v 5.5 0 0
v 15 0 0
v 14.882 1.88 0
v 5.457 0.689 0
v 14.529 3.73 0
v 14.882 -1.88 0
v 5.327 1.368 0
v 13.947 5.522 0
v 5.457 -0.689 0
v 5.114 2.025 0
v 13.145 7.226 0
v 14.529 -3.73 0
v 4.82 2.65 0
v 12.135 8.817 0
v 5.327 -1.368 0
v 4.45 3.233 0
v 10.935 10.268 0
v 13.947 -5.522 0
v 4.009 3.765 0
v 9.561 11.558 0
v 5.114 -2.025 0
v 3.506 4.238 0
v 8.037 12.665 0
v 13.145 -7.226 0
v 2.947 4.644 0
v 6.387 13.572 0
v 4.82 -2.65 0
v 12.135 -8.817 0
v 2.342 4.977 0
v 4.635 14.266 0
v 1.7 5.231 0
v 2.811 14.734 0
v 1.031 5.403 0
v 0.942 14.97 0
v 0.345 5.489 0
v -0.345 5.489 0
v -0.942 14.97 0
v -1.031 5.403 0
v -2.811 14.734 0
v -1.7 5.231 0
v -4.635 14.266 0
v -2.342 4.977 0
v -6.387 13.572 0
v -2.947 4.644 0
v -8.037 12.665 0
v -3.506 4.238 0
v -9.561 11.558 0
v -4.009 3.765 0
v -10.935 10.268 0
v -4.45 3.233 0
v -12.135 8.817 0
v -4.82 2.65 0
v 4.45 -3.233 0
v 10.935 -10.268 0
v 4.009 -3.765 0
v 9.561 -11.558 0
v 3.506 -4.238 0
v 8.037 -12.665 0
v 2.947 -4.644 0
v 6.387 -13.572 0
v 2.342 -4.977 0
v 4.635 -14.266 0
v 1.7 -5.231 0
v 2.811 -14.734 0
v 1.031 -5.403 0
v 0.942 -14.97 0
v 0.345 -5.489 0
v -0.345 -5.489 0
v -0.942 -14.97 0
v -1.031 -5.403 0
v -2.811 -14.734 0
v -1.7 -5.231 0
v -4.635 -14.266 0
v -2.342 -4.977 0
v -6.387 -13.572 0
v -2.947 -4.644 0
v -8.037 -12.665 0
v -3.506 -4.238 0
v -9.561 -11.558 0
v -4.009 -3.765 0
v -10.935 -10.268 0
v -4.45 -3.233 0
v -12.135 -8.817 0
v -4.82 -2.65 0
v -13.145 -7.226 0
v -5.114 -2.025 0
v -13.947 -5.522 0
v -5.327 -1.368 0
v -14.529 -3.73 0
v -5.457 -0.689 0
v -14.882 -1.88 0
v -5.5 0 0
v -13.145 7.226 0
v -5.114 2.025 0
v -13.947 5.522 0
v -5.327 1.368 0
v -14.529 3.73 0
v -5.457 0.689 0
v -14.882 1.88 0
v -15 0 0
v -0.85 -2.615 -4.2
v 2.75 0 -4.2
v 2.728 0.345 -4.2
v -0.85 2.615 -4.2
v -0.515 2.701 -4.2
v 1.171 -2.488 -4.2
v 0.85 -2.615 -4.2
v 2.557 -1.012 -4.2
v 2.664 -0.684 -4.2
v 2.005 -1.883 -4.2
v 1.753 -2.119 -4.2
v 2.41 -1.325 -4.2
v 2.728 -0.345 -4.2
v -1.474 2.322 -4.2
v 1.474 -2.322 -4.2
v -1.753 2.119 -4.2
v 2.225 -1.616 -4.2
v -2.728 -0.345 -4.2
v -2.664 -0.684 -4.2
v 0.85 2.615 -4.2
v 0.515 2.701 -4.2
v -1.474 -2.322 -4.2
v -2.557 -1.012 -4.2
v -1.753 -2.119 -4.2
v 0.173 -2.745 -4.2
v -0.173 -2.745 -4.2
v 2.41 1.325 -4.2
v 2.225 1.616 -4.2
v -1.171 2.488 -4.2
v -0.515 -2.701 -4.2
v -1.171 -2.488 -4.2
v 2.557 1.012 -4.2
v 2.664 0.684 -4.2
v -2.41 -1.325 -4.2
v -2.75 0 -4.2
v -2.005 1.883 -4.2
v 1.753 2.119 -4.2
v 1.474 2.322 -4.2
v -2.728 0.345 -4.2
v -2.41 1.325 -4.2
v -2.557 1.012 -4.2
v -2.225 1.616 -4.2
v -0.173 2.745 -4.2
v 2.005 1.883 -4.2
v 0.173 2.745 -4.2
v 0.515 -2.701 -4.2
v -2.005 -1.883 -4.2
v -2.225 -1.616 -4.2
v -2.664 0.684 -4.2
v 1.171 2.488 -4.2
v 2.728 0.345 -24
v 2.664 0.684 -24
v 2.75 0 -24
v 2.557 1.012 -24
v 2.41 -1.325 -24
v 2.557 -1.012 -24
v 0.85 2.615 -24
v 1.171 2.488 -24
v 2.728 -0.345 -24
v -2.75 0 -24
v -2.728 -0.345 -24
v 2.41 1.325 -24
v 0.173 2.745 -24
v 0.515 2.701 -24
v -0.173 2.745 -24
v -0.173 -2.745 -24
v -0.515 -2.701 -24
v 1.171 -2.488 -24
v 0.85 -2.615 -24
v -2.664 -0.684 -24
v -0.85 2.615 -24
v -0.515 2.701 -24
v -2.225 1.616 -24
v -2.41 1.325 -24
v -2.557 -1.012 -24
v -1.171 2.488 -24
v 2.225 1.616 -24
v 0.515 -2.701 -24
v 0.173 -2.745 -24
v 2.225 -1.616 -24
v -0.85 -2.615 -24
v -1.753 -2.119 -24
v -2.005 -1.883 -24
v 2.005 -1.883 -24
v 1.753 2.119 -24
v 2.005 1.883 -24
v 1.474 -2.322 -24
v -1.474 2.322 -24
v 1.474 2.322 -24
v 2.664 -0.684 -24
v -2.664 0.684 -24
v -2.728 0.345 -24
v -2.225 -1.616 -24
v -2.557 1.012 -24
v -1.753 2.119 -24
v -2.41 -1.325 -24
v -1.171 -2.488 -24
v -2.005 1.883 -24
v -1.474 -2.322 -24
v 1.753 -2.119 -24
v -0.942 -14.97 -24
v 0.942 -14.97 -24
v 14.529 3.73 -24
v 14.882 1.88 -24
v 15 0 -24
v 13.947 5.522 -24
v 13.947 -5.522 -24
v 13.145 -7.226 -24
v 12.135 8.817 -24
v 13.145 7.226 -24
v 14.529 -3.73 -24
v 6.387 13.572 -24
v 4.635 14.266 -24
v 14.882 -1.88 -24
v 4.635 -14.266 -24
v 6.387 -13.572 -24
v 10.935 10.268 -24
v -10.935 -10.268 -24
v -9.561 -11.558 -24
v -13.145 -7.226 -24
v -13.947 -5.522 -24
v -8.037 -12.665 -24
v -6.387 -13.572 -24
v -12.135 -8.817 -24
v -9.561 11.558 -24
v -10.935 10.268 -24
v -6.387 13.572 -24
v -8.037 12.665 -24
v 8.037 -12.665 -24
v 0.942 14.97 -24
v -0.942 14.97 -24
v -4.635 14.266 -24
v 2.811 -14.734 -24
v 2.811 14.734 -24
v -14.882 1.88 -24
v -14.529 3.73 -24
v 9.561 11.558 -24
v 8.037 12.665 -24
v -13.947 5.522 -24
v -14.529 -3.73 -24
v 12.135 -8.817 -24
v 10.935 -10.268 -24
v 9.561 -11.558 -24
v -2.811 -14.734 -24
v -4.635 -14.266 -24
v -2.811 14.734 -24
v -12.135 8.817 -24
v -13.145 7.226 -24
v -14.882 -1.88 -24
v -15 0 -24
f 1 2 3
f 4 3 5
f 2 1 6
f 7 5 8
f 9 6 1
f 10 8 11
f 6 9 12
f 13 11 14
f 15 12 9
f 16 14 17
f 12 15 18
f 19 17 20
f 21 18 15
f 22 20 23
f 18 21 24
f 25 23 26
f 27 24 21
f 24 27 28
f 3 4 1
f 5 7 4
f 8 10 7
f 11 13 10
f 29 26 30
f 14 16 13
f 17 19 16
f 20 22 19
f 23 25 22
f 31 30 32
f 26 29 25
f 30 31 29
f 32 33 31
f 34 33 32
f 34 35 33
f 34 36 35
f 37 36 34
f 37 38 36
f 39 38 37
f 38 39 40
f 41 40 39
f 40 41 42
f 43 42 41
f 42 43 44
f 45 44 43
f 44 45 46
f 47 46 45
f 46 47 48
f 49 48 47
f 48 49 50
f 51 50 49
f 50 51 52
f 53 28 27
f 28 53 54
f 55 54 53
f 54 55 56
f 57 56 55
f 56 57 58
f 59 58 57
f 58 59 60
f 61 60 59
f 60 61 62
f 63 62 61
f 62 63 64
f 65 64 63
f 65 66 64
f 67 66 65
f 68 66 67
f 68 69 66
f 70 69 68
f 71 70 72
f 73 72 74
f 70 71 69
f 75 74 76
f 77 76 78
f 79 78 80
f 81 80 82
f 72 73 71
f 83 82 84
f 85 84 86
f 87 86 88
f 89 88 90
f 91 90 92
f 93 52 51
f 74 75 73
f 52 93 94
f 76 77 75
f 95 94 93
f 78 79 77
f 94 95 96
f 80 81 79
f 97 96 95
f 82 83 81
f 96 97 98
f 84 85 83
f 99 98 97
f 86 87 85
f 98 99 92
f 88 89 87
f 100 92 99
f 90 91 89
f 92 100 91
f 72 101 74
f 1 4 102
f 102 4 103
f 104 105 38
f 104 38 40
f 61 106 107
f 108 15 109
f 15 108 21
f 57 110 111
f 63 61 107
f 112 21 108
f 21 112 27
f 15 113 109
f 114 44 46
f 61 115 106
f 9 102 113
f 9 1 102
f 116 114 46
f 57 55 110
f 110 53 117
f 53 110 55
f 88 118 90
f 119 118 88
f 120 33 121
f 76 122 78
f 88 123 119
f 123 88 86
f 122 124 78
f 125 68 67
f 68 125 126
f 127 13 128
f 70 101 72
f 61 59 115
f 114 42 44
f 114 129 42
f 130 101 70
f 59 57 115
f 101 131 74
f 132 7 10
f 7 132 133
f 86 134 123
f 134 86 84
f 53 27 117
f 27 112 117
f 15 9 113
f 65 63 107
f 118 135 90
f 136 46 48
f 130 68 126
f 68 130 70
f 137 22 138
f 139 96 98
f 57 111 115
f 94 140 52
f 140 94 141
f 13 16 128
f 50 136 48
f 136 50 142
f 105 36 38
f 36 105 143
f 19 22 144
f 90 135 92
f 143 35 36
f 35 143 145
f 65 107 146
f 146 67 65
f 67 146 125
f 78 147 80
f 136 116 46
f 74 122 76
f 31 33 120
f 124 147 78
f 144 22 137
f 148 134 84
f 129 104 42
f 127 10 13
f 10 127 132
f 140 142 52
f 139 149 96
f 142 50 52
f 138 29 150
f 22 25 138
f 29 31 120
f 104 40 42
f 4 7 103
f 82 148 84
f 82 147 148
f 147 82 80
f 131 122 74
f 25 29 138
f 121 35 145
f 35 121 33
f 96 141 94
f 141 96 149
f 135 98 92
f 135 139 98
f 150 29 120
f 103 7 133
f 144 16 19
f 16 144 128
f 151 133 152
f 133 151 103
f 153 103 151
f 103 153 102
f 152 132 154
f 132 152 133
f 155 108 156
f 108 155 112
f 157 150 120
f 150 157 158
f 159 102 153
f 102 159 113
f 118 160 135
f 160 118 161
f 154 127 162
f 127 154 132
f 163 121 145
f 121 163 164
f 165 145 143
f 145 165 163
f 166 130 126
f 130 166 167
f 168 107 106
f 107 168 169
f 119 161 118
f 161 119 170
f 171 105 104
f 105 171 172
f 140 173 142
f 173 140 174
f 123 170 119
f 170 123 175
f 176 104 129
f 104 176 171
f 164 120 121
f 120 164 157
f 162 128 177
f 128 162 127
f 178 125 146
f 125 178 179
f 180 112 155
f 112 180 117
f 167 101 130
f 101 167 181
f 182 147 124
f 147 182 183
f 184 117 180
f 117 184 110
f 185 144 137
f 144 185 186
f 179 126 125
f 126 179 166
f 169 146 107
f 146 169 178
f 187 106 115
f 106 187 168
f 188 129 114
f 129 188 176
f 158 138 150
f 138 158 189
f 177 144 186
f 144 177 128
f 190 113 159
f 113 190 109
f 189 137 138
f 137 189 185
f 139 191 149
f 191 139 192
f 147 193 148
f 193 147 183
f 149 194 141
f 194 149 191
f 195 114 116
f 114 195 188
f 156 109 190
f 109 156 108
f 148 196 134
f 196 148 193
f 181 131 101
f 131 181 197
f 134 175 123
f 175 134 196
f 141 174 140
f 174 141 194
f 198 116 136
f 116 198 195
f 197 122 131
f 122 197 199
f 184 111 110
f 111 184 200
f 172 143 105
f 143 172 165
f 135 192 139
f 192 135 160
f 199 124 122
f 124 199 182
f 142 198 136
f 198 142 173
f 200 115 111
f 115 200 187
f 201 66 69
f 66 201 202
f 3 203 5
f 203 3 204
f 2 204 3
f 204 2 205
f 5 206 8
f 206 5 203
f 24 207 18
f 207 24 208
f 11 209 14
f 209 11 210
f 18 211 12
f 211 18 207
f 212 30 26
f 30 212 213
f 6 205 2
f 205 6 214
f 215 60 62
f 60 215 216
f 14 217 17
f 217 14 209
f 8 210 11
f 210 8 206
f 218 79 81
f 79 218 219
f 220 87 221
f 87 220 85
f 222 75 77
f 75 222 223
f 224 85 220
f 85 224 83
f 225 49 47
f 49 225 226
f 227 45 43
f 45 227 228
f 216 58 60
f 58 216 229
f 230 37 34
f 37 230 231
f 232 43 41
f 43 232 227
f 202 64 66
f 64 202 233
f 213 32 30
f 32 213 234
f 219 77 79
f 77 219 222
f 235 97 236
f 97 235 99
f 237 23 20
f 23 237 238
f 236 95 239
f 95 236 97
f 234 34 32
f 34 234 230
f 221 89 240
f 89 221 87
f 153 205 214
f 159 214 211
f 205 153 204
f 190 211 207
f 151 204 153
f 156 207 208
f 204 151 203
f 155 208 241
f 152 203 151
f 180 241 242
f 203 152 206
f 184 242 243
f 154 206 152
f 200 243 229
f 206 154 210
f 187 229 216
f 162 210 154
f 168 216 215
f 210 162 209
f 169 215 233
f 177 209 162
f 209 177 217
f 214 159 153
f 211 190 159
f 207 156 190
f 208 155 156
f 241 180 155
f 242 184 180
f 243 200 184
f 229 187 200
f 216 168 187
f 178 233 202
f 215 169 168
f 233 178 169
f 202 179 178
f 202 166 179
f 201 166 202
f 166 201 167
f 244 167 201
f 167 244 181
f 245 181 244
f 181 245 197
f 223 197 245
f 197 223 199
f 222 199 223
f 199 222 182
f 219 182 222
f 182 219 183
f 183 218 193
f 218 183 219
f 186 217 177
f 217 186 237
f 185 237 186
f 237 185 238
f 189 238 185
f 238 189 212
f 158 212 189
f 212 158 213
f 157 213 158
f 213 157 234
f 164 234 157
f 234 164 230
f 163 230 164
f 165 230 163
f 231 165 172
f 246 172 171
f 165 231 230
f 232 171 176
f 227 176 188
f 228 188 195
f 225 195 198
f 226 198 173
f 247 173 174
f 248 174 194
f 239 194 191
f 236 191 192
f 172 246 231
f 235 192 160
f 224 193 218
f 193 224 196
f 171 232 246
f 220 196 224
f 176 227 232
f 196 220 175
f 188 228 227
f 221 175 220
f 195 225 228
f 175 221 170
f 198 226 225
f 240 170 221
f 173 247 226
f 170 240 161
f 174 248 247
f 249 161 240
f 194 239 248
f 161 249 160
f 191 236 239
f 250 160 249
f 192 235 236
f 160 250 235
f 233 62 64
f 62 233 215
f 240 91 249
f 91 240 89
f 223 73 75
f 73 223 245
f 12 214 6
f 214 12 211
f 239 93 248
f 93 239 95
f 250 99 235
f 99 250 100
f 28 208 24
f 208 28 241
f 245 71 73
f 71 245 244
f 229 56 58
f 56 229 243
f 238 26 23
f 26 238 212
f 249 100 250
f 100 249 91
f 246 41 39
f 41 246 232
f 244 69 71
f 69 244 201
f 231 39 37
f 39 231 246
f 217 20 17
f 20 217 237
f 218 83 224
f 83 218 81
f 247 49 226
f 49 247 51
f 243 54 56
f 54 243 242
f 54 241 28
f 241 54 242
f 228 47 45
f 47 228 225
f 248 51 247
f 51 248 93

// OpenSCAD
$fn = 50;

difference() {
	union() {
		translate(v = [0, 0, -24.0]) {
			cylinder(h = 24, r = 15.0);
		}
	}
	union() {
		translate(v = [0, 0, 0]) {
			rotate(a = [0, 0, 0]) {
				difference() {
					union() {
						translate(v = [0, 0, -27.0]) {
							cylinder(h = 27, r = 2.25);
						}
						translate(v = [0, 0, -4.2]) {
							cylinder(h = 4.2, r1 = 2.75, r2 = 5.5);
						}
						translate(v = [0, 0, -27.0]) {
							cylinder(h = 27, r = 2.75);
						}
						translate(v = [0, 0, -27.0]) {
							cylinder(h = 27, r = 2.25);
						}
					}
					union();
				}
			}
		}
	}
}
